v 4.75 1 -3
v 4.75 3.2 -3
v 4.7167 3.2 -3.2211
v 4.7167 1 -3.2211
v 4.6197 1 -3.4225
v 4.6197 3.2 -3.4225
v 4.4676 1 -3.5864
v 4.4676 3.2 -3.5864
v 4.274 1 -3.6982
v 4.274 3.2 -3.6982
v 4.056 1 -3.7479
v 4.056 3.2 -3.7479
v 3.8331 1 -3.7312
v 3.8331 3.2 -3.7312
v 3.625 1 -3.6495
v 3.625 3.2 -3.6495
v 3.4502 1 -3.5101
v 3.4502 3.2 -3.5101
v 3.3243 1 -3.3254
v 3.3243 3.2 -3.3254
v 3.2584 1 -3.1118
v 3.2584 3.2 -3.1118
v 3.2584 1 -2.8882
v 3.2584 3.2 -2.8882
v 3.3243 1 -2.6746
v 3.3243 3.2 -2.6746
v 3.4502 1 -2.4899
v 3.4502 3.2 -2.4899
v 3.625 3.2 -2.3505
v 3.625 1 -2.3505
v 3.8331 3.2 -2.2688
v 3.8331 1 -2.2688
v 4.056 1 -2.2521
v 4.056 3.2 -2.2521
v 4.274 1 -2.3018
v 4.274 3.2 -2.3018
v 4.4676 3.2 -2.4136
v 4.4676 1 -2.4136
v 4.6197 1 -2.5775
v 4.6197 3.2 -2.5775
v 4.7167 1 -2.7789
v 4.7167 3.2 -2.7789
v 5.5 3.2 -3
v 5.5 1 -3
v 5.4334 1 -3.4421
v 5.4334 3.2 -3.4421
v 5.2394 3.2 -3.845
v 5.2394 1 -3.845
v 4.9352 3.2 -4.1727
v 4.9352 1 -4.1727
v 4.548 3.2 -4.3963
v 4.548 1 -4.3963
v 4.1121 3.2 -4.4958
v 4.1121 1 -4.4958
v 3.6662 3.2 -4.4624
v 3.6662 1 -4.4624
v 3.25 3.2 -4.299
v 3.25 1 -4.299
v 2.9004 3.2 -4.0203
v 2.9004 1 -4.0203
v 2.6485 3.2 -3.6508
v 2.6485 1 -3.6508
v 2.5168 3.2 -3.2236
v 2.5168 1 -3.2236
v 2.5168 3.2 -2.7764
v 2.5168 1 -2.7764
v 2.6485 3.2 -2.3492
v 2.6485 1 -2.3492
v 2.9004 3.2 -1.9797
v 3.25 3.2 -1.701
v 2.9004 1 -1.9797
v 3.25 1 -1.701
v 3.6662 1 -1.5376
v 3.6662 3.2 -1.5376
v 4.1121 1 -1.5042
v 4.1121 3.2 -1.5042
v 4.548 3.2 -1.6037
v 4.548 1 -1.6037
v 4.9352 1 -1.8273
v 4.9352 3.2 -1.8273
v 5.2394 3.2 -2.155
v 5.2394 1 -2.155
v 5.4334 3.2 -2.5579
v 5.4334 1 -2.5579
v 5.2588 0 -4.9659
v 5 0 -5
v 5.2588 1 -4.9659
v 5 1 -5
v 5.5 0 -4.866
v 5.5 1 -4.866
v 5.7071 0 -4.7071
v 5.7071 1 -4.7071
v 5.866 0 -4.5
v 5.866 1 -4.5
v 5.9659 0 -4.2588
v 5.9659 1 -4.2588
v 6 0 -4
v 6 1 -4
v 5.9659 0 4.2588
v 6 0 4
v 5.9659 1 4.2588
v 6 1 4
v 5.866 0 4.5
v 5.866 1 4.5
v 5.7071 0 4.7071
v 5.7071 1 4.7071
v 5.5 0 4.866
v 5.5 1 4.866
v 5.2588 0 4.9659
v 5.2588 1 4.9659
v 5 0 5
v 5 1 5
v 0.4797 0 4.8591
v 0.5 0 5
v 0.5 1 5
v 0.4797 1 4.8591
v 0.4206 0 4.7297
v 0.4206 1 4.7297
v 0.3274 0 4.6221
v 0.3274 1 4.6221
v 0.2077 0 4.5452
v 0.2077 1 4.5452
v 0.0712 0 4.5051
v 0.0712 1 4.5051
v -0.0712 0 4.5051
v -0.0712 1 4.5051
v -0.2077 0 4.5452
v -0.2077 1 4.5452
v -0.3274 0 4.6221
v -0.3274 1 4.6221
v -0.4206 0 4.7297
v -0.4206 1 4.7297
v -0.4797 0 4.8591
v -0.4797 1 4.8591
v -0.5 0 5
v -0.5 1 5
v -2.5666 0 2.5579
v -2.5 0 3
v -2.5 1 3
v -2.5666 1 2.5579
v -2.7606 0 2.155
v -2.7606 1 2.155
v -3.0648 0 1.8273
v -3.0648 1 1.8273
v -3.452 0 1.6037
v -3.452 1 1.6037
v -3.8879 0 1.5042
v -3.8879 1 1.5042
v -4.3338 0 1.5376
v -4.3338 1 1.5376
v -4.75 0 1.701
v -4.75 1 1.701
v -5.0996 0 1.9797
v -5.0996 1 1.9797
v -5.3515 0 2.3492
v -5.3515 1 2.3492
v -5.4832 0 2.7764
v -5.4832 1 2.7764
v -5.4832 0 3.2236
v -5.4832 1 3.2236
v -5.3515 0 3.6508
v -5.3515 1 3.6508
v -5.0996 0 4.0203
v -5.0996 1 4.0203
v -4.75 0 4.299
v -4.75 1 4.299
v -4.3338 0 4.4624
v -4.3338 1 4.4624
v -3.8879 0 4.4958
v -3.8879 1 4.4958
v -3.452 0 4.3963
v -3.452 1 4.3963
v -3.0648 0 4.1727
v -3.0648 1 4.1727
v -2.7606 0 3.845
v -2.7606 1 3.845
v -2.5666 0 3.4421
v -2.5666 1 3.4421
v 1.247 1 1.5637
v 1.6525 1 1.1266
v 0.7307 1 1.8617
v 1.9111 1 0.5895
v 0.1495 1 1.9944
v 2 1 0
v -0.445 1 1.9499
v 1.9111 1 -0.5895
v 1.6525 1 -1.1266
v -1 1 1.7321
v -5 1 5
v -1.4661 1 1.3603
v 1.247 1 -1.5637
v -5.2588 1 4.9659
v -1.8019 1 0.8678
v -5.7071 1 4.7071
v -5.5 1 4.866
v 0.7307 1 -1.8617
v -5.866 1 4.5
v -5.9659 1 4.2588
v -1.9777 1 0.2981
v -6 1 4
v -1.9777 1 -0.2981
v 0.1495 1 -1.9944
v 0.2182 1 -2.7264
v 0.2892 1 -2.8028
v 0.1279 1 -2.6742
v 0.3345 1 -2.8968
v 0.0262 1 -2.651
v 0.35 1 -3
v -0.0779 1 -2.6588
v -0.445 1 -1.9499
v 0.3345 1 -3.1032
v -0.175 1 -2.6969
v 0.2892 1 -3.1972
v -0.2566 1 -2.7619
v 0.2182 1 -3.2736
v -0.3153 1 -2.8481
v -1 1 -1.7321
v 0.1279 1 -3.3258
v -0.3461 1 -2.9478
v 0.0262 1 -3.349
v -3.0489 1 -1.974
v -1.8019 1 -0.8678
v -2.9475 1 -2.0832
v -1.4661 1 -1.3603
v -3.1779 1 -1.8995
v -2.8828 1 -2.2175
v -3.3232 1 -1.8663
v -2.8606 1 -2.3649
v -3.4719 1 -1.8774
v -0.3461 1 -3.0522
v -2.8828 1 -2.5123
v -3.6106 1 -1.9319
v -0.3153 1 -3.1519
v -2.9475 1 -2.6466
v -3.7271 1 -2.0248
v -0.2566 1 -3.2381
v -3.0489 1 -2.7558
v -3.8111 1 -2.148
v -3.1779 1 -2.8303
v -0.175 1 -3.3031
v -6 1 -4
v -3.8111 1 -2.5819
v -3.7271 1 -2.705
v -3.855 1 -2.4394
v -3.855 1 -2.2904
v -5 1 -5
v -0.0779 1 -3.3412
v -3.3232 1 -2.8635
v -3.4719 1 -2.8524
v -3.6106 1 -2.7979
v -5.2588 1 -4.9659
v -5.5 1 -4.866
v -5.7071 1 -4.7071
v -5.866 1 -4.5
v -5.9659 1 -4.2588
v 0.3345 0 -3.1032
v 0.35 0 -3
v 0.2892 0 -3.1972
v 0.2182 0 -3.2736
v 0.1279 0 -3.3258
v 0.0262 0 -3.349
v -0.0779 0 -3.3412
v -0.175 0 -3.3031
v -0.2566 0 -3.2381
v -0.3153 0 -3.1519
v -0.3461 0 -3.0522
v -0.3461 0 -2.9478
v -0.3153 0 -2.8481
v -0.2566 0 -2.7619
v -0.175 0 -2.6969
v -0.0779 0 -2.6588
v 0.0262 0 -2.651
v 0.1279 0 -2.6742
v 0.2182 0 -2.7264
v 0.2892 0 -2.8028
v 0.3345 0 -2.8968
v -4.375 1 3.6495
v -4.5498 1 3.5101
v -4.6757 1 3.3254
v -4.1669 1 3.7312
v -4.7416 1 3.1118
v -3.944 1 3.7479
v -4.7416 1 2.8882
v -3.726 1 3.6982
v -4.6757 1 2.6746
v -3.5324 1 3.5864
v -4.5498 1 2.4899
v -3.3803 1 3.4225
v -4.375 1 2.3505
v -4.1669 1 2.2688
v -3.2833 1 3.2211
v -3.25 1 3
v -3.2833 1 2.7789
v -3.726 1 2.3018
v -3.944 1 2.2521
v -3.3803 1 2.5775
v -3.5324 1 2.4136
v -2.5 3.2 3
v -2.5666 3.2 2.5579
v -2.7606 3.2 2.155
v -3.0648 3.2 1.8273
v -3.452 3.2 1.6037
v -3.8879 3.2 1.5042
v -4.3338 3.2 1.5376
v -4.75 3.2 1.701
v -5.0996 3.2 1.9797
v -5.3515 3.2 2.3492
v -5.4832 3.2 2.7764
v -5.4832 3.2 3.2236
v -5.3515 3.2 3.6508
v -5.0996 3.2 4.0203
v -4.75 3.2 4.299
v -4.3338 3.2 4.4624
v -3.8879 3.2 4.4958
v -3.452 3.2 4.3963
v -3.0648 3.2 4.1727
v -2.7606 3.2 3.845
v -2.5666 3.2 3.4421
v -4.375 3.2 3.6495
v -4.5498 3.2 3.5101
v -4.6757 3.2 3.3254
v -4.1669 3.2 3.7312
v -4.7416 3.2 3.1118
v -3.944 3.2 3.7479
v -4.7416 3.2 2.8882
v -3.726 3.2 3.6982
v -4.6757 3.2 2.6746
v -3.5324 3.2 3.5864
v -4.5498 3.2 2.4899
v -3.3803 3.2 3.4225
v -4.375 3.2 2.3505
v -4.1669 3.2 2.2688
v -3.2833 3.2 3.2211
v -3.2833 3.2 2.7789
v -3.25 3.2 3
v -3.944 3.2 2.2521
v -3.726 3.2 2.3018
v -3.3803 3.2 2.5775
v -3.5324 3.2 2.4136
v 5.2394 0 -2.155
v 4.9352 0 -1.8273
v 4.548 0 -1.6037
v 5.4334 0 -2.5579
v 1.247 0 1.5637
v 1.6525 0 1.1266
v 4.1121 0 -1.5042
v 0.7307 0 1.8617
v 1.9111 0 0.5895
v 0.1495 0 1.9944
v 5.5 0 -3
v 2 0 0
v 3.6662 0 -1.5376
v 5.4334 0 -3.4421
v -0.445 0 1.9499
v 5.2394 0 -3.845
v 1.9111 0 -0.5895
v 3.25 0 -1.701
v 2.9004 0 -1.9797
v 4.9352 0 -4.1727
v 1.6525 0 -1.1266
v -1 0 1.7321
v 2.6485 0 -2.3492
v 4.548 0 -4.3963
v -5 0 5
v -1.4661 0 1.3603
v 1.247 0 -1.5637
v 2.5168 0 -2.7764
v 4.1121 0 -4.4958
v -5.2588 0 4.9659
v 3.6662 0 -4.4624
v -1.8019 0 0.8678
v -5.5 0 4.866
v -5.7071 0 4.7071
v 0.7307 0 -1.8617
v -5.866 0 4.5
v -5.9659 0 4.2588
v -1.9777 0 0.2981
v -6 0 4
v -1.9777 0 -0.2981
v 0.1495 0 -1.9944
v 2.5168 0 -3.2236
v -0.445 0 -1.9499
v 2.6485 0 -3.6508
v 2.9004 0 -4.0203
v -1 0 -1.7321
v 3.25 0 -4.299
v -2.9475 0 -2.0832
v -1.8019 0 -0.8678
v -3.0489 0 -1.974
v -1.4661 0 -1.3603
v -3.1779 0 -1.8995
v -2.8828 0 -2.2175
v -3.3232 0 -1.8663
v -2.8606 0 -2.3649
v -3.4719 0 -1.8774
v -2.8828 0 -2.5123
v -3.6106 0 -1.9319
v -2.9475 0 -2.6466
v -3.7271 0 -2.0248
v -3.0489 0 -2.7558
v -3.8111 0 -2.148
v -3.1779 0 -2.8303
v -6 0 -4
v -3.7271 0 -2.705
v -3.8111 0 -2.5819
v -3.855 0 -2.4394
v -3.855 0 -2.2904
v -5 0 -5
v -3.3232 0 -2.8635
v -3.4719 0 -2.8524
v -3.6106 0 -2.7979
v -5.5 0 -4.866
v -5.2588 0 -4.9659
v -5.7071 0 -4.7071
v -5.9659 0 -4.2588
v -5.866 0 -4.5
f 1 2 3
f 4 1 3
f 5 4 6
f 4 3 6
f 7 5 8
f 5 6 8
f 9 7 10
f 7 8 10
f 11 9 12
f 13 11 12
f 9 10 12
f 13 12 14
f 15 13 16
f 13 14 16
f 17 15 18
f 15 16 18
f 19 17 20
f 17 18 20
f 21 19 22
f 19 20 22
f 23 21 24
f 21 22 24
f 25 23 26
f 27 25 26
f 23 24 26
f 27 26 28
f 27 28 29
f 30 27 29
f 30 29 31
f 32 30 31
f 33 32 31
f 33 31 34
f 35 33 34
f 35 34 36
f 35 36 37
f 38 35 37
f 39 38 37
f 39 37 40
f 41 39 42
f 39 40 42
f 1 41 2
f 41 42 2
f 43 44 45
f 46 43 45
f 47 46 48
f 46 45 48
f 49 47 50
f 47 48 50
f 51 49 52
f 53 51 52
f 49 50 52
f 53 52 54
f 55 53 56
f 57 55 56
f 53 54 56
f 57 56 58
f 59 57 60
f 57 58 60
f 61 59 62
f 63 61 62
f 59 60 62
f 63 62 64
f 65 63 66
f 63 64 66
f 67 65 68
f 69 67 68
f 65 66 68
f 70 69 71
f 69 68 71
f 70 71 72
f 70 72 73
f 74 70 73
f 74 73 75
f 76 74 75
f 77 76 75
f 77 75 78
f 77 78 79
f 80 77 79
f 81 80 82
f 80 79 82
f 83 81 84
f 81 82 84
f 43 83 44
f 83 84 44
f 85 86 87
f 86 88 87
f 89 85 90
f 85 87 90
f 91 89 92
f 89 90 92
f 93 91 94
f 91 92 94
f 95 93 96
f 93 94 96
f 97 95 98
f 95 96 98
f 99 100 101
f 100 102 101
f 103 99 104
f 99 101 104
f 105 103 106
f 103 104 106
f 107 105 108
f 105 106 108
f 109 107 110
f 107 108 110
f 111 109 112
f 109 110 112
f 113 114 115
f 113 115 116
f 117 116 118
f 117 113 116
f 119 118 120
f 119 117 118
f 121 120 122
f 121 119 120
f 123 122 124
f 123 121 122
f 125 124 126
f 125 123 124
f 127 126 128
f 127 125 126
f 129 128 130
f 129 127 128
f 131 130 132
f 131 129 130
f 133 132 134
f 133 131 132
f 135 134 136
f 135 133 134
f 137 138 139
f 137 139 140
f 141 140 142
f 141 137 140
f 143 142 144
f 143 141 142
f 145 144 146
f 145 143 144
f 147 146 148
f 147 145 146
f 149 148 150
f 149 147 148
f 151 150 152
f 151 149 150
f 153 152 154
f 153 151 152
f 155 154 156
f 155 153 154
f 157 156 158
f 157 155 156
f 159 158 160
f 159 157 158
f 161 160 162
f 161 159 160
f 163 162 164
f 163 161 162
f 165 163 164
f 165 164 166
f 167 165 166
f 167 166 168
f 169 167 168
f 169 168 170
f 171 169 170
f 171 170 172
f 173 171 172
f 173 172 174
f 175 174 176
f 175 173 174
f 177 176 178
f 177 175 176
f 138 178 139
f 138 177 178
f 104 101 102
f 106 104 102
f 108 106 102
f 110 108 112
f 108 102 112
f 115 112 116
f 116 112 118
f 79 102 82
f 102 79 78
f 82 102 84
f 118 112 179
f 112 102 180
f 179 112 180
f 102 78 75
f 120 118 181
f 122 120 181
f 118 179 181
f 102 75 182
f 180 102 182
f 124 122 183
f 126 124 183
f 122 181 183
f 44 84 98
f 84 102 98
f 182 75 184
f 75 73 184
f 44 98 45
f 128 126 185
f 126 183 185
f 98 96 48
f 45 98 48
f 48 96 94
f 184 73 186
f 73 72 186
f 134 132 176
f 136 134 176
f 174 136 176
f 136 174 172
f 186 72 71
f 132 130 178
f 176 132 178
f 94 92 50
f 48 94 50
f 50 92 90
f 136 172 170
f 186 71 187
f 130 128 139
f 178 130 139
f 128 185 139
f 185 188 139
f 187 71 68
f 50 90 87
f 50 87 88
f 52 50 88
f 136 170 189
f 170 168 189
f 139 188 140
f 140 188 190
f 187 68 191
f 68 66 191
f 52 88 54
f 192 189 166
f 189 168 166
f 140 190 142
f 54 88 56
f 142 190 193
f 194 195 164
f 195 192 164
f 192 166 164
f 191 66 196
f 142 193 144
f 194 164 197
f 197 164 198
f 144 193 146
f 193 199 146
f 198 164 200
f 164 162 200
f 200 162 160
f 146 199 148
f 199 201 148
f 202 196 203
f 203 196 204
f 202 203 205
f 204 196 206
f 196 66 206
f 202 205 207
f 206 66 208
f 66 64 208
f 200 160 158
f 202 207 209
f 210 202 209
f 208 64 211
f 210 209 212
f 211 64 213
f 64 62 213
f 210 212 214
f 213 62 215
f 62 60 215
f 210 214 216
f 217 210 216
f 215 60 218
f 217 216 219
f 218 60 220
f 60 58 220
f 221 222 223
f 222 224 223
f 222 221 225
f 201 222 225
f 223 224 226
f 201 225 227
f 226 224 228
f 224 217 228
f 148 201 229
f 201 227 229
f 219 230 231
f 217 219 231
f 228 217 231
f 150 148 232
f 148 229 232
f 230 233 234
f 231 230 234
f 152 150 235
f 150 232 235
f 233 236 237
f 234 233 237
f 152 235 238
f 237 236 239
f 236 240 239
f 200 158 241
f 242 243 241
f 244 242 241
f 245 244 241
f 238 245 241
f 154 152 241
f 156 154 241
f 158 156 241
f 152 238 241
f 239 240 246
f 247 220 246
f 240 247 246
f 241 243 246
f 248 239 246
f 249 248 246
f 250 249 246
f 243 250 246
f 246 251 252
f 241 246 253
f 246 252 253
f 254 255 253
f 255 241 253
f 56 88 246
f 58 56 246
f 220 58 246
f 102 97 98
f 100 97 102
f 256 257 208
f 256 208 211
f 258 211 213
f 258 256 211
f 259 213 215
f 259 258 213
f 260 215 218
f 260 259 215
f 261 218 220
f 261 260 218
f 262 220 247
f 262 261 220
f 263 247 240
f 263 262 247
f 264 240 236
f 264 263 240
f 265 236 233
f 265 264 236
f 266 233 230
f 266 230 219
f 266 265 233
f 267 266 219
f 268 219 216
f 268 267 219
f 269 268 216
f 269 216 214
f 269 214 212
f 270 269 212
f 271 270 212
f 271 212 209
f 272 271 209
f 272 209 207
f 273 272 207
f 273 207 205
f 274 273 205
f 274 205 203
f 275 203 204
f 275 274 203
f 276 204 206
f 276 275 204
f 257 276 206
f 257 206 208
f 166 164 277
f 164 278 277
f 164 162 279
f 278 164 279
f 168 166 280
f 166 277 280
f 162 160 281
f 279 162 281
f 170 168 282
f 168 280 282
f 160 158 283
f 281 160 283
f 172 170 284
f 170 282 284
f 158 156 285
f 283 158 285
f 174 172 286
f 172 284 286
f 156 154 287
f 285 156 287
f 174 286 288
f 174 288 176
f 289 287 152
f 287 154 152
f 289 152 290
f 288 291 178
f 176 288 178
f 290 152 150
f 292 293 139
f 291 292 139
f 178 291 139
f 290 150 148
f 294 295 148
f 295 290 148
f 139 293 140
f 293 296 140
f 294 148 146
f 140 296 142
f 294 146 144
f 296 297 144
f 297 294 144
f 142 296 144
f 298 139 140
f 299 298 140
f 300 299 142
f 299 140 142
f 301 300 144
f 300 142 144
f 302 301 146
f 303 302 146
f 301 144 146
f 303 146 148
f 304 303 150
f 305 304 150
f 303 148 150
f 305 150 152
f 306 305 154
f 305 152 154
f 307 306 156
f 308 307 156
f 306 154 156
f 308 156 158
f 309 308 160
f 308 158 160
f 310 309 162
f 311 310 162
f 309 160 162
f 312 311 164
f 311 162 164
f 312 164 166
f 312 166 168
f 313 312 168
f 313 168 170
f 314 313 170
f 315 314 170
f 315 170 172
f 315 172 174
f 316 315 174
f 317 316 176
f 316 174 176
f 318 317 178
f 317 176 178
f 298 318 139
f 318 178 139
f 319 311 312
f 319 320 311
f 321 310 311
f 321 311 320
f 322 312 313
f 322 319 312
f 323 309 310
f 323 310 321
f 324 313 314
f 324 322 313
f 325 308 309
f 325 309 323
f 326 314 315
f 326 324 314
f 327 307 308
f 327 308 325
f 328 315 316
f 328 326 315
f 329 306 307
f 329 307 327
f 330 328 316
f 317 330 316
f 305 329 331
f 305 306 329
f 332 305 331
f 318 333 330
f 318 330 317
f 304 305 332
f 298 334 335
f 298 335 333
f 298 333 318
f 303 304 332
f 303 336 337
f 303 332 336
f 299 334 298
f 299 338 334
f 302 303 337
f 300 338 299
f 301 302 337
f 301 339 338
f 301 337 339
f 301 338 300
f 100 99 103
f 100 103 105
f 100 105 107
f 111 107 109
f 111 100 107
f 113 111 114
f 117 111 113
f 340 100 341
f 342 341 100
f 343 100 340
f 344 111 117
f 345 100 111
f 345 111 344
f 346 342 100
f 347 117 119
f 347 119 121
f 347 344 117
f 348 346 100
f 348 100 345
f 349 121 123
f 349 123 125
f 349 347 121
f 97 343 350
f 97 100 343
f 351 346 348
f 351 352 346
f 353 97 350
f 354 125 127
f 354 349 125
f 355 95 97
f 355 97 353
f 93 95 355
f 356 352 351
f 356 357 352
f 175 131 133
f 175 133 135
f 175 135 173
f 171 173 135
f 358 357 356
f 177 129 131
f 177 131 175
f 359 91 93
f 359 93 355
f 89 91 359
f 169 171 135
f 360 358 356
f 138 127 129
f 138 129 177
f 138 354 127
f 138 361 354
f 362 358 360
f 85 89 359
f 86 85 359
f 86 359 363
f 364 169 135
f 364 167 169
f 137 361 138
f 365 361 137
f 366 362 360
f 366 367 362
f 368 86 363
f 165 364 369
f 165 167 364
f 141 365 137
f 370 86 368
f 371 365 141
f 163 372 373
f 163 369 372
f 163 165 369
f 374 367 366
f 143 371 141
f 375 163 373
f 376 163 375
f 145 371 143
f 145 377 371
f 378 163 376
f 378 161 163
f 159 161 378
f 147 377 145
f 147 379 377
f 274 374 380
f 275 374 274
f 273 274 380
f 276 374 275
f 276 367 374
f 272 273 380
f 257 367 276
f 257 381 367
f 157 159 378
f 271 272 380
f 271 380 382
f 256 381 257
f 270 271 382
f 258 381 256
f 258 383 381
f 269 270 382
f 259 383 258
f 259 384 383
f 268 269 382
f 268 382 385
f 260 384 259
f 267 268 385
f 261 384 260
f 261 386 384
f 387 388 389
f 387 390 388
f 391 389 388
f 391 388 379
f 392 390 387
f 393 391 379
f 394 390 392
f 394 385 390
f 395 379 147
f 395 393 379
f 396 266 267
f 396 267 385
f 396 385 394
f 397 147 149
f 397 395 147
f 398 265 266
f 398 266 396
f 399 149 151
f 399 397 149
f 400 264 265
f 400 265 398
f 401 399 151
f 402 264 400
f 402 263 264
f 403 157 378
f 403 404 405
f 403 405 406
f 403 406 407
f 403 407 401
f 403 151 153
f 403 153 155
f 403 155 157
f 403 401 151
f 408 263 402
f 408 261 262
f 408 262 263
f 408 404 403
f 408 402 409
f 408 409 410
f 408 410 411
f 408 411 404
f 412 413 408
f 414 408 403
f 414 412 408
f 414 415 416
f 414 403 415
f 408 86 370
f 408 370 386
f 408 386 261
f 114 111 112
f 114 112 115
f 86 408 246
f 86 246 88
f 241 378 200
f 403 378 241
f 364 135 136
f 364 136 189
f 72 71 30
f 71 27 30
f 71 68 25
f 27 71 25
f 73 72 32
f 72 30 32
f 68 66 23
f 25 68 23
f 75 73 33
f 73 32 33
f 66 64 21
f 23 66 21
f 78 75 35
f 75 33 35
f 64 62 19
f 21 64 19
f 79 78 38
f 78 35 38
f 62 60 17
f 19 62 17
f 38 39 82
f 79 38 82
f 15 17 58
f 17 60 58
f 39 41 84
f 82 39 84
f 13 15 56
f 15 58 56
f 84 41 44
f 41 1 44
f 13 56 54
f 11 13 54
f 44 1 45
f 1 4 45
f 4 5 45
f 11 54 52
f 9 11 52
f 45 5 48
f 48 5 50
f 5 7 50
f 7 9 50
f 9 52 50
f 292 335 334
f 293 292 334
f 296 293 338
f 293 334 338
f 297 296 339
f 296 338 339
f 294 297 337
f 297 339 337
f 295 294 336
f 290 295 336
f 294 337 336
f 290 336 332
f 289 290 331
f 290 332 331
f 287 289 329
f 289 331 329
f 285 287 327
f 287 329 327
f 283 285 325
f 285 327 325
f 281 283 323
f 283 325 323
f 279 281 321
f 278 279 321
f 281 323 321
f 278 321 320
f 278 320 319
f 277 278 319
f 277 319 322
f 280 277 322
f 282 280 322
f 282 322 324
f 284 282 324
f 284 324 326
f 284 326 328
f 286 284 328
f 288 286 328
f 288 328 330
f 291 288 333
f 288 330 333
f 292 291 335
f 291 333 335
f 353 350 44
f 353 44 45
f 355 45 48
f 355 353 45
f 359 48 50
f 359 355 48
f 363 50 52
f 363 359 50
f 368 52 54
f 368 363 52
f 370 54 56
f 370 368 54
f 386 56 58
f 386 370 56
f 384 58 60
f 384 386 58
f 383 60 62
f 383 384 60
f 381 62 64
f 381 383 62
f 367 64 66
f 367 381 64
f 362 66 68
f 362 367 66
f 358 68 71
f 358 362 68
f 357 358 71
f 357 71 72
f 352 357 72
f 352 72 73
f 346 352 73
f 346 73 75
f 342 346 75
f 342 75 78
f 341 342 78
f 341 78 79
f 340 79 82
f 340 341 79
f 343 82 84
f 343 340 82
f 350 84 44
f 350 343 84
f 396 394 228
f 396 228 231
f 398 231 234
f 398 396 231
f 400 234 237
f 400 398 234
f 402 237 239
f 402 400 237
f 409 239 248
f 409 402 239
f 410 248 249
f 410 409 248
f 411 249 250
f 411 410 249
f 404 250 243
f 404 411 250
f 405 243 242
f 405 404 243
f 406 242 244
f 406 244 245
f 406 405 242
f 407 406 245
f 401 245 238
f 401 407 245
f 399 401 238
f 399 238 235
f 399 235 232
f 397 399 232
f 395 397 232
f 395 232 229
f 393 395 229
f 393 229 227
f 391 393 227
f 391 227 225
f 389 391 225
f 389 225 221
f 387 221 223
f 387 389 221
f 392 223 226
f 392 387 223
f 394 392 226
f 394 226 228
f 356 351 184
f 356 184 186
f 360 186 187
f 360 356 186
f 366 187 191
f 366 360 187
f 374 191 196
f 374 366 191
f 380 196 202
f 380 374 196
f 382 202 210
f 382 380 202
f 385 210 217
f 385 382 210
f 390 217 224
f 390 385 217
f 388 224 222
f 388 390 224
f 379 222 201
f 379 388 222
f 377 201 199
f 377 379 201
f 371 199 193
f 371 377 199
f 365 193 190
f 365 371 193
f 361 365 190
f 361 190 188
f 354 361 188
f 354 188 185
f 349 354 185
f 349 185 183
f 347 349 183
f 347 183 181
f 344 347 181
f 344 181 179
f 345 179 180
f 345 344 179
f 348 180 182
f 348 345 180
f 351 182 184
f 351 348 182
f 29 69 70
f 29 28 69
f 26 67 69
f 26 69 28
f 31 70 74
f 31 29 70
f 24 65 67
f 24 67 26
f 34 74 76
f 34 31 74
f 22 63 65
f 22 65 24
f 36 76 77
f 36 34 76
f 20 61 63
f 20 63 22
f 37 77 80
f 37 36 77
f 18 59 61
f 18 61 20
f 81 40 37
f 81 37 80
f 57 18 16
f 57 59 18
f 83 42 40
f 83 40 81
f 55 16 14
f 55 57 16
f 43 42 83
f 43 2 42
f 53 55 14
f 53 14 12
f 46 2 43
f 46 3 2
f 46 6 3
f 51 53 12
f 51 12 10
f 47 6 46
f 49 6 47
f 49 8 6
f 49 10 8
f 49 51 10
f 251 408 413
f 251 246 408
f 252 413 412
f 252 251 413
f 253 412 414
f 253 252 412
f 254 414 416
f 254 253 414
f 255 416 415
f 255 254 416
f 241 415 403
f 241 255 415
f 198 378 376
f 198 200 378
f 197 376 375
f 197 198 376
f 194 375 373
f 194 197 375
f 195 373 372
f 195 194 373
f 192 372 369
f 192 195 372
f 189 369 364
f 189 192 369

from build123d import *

# Parameters (mm, degrees)
CROQUIS1_R                = 1.5
CROQUIS1_R_2              = 2
CROQUIS1_R_3              = 0.35
CROQUIS1_R_4              = 0.5
SALIENTE_EXTRUIR1_DEPTH   = 1
CROQUIS2_R                = 1.5
SALIENTE_EXTRUIR2_DEPTH   = 2.2
SALIENTE_EXTRUIR2_2_DEPTH = 2.2
REDONDEO1_R               = 1
CROQUIS3_R                = 0.75
CORTAR_EXTRUIR1_DEPTH     = 2.2


with BuildPart() as part:
    # Croquis1 → Saliente-Extruir1 (new body)
    with BuildSketch(Plane(origin=(0, 0, 0), x_dir=(1, 0, 0), z_dir=(0, 1, 0))):
        with BuildLine():
            Line((-6, 5), (6, 5))
            Line((6, 5), (6, -5))
            Line((6, -5), (0.5, -5))
            ThreePointArc((0.5, -5), (0, -4.5), (-0.5, -5))
            Line((-0.5, -5), (-6, -5))
            Line((-6, -5), (-6, 5))
        make_face()
        with Locations((4, 3)):
            Circle(CROQUIS1_R, mode=Mode.SUBTRACT)
        with Locations((-4, -3)):
            Circle(CROQUIS1_R, mode=Mode.SUBTRACT)
        Circle(CROQUIS1_R_2, mode=Mode.SUBTRACT)
        with Locations((0, 3)):
            Circle(CROQUIS1_R_3, mode=Mode.SUBTRACT)
        with Locations((-3.360597475, 2.364908389)):
            Circle(CROQUIS1_R_4, mode=Mode.SUBTRACT)
    extrude(amount=SALIENTE_EXTRUIR1_DEPTH)

    # Redondeo1
    redondeo1_edges = [part.edges().sort_by_distance(p)[0] for p in [
        (-6, 0.5, 5),
        (-6, 0.5, -5),
        (6, 0.5, -5),
        (6, 0.5, 5),
    ]]
    fillet(redondeo1_edges, radius=REDONDEO1_R)


with BuildPart() as body_2:
    # Croquis2 → Saliente-Extruir2 (new body)
    with BuildSketch(Plane(origin=(0, 1, 0), x_dir=(1, 0, 0), z_dir=(0, 1, 0))):
        with Locations((4, 3)):
            Circle(CROQUIS2_R)
    extrude(amount=SALIENTE_EXTRUIR2_DEPTH)


with BuildPart() as body_3:
    # Croquis2 → Saliente-Extruir2 2 (new body)
    with BuildSketch(Plane(origin=(0, 1, 0), x_dir=(1, 0, 0), z_dir=(0, 1, 0))):
        with Locations((-4, -3)):
            Circle(CROQUIS2_R)
    extrude(amount=SALIENTE_EXTRUIR2_2_DEPTH)


with BuildPart() as cortar_extruir1_tool:
    # Croquis3 → Cortar-Extruir1 (new body)
    with BuildSketch(Plane(origin=(0, 3.2, 0), x_dir=(1, 0, 0), z_dir=(0, 1, 0))):
        with Locations((4, 3)):
            Circle(CROQUIS3_R)
        with Locations((-4, -3)):
            Circle(CROQUIS3_R)
    extrude(amount=-CORTAR_EXTRUIR1_DEPTH)


with BuildPart() as body_2_1:
    add(body_2.part)

    # Cortar-Extruir1: cut by cortar_extruir1_tool
    add(cortar_extruir1_tool.part, mode=Mode.SUBTRACT)


with BuildPart() as body_3_1:
    add(body_3.part)

    # Cortar-Extruir1: cut by cortar_extruir1_tool
    add(cortar_extruir1_tool.part, mode=Mode.SUBTRACT)


solid = Compound([part.part, body_2_1.part, body_3_1.part])
